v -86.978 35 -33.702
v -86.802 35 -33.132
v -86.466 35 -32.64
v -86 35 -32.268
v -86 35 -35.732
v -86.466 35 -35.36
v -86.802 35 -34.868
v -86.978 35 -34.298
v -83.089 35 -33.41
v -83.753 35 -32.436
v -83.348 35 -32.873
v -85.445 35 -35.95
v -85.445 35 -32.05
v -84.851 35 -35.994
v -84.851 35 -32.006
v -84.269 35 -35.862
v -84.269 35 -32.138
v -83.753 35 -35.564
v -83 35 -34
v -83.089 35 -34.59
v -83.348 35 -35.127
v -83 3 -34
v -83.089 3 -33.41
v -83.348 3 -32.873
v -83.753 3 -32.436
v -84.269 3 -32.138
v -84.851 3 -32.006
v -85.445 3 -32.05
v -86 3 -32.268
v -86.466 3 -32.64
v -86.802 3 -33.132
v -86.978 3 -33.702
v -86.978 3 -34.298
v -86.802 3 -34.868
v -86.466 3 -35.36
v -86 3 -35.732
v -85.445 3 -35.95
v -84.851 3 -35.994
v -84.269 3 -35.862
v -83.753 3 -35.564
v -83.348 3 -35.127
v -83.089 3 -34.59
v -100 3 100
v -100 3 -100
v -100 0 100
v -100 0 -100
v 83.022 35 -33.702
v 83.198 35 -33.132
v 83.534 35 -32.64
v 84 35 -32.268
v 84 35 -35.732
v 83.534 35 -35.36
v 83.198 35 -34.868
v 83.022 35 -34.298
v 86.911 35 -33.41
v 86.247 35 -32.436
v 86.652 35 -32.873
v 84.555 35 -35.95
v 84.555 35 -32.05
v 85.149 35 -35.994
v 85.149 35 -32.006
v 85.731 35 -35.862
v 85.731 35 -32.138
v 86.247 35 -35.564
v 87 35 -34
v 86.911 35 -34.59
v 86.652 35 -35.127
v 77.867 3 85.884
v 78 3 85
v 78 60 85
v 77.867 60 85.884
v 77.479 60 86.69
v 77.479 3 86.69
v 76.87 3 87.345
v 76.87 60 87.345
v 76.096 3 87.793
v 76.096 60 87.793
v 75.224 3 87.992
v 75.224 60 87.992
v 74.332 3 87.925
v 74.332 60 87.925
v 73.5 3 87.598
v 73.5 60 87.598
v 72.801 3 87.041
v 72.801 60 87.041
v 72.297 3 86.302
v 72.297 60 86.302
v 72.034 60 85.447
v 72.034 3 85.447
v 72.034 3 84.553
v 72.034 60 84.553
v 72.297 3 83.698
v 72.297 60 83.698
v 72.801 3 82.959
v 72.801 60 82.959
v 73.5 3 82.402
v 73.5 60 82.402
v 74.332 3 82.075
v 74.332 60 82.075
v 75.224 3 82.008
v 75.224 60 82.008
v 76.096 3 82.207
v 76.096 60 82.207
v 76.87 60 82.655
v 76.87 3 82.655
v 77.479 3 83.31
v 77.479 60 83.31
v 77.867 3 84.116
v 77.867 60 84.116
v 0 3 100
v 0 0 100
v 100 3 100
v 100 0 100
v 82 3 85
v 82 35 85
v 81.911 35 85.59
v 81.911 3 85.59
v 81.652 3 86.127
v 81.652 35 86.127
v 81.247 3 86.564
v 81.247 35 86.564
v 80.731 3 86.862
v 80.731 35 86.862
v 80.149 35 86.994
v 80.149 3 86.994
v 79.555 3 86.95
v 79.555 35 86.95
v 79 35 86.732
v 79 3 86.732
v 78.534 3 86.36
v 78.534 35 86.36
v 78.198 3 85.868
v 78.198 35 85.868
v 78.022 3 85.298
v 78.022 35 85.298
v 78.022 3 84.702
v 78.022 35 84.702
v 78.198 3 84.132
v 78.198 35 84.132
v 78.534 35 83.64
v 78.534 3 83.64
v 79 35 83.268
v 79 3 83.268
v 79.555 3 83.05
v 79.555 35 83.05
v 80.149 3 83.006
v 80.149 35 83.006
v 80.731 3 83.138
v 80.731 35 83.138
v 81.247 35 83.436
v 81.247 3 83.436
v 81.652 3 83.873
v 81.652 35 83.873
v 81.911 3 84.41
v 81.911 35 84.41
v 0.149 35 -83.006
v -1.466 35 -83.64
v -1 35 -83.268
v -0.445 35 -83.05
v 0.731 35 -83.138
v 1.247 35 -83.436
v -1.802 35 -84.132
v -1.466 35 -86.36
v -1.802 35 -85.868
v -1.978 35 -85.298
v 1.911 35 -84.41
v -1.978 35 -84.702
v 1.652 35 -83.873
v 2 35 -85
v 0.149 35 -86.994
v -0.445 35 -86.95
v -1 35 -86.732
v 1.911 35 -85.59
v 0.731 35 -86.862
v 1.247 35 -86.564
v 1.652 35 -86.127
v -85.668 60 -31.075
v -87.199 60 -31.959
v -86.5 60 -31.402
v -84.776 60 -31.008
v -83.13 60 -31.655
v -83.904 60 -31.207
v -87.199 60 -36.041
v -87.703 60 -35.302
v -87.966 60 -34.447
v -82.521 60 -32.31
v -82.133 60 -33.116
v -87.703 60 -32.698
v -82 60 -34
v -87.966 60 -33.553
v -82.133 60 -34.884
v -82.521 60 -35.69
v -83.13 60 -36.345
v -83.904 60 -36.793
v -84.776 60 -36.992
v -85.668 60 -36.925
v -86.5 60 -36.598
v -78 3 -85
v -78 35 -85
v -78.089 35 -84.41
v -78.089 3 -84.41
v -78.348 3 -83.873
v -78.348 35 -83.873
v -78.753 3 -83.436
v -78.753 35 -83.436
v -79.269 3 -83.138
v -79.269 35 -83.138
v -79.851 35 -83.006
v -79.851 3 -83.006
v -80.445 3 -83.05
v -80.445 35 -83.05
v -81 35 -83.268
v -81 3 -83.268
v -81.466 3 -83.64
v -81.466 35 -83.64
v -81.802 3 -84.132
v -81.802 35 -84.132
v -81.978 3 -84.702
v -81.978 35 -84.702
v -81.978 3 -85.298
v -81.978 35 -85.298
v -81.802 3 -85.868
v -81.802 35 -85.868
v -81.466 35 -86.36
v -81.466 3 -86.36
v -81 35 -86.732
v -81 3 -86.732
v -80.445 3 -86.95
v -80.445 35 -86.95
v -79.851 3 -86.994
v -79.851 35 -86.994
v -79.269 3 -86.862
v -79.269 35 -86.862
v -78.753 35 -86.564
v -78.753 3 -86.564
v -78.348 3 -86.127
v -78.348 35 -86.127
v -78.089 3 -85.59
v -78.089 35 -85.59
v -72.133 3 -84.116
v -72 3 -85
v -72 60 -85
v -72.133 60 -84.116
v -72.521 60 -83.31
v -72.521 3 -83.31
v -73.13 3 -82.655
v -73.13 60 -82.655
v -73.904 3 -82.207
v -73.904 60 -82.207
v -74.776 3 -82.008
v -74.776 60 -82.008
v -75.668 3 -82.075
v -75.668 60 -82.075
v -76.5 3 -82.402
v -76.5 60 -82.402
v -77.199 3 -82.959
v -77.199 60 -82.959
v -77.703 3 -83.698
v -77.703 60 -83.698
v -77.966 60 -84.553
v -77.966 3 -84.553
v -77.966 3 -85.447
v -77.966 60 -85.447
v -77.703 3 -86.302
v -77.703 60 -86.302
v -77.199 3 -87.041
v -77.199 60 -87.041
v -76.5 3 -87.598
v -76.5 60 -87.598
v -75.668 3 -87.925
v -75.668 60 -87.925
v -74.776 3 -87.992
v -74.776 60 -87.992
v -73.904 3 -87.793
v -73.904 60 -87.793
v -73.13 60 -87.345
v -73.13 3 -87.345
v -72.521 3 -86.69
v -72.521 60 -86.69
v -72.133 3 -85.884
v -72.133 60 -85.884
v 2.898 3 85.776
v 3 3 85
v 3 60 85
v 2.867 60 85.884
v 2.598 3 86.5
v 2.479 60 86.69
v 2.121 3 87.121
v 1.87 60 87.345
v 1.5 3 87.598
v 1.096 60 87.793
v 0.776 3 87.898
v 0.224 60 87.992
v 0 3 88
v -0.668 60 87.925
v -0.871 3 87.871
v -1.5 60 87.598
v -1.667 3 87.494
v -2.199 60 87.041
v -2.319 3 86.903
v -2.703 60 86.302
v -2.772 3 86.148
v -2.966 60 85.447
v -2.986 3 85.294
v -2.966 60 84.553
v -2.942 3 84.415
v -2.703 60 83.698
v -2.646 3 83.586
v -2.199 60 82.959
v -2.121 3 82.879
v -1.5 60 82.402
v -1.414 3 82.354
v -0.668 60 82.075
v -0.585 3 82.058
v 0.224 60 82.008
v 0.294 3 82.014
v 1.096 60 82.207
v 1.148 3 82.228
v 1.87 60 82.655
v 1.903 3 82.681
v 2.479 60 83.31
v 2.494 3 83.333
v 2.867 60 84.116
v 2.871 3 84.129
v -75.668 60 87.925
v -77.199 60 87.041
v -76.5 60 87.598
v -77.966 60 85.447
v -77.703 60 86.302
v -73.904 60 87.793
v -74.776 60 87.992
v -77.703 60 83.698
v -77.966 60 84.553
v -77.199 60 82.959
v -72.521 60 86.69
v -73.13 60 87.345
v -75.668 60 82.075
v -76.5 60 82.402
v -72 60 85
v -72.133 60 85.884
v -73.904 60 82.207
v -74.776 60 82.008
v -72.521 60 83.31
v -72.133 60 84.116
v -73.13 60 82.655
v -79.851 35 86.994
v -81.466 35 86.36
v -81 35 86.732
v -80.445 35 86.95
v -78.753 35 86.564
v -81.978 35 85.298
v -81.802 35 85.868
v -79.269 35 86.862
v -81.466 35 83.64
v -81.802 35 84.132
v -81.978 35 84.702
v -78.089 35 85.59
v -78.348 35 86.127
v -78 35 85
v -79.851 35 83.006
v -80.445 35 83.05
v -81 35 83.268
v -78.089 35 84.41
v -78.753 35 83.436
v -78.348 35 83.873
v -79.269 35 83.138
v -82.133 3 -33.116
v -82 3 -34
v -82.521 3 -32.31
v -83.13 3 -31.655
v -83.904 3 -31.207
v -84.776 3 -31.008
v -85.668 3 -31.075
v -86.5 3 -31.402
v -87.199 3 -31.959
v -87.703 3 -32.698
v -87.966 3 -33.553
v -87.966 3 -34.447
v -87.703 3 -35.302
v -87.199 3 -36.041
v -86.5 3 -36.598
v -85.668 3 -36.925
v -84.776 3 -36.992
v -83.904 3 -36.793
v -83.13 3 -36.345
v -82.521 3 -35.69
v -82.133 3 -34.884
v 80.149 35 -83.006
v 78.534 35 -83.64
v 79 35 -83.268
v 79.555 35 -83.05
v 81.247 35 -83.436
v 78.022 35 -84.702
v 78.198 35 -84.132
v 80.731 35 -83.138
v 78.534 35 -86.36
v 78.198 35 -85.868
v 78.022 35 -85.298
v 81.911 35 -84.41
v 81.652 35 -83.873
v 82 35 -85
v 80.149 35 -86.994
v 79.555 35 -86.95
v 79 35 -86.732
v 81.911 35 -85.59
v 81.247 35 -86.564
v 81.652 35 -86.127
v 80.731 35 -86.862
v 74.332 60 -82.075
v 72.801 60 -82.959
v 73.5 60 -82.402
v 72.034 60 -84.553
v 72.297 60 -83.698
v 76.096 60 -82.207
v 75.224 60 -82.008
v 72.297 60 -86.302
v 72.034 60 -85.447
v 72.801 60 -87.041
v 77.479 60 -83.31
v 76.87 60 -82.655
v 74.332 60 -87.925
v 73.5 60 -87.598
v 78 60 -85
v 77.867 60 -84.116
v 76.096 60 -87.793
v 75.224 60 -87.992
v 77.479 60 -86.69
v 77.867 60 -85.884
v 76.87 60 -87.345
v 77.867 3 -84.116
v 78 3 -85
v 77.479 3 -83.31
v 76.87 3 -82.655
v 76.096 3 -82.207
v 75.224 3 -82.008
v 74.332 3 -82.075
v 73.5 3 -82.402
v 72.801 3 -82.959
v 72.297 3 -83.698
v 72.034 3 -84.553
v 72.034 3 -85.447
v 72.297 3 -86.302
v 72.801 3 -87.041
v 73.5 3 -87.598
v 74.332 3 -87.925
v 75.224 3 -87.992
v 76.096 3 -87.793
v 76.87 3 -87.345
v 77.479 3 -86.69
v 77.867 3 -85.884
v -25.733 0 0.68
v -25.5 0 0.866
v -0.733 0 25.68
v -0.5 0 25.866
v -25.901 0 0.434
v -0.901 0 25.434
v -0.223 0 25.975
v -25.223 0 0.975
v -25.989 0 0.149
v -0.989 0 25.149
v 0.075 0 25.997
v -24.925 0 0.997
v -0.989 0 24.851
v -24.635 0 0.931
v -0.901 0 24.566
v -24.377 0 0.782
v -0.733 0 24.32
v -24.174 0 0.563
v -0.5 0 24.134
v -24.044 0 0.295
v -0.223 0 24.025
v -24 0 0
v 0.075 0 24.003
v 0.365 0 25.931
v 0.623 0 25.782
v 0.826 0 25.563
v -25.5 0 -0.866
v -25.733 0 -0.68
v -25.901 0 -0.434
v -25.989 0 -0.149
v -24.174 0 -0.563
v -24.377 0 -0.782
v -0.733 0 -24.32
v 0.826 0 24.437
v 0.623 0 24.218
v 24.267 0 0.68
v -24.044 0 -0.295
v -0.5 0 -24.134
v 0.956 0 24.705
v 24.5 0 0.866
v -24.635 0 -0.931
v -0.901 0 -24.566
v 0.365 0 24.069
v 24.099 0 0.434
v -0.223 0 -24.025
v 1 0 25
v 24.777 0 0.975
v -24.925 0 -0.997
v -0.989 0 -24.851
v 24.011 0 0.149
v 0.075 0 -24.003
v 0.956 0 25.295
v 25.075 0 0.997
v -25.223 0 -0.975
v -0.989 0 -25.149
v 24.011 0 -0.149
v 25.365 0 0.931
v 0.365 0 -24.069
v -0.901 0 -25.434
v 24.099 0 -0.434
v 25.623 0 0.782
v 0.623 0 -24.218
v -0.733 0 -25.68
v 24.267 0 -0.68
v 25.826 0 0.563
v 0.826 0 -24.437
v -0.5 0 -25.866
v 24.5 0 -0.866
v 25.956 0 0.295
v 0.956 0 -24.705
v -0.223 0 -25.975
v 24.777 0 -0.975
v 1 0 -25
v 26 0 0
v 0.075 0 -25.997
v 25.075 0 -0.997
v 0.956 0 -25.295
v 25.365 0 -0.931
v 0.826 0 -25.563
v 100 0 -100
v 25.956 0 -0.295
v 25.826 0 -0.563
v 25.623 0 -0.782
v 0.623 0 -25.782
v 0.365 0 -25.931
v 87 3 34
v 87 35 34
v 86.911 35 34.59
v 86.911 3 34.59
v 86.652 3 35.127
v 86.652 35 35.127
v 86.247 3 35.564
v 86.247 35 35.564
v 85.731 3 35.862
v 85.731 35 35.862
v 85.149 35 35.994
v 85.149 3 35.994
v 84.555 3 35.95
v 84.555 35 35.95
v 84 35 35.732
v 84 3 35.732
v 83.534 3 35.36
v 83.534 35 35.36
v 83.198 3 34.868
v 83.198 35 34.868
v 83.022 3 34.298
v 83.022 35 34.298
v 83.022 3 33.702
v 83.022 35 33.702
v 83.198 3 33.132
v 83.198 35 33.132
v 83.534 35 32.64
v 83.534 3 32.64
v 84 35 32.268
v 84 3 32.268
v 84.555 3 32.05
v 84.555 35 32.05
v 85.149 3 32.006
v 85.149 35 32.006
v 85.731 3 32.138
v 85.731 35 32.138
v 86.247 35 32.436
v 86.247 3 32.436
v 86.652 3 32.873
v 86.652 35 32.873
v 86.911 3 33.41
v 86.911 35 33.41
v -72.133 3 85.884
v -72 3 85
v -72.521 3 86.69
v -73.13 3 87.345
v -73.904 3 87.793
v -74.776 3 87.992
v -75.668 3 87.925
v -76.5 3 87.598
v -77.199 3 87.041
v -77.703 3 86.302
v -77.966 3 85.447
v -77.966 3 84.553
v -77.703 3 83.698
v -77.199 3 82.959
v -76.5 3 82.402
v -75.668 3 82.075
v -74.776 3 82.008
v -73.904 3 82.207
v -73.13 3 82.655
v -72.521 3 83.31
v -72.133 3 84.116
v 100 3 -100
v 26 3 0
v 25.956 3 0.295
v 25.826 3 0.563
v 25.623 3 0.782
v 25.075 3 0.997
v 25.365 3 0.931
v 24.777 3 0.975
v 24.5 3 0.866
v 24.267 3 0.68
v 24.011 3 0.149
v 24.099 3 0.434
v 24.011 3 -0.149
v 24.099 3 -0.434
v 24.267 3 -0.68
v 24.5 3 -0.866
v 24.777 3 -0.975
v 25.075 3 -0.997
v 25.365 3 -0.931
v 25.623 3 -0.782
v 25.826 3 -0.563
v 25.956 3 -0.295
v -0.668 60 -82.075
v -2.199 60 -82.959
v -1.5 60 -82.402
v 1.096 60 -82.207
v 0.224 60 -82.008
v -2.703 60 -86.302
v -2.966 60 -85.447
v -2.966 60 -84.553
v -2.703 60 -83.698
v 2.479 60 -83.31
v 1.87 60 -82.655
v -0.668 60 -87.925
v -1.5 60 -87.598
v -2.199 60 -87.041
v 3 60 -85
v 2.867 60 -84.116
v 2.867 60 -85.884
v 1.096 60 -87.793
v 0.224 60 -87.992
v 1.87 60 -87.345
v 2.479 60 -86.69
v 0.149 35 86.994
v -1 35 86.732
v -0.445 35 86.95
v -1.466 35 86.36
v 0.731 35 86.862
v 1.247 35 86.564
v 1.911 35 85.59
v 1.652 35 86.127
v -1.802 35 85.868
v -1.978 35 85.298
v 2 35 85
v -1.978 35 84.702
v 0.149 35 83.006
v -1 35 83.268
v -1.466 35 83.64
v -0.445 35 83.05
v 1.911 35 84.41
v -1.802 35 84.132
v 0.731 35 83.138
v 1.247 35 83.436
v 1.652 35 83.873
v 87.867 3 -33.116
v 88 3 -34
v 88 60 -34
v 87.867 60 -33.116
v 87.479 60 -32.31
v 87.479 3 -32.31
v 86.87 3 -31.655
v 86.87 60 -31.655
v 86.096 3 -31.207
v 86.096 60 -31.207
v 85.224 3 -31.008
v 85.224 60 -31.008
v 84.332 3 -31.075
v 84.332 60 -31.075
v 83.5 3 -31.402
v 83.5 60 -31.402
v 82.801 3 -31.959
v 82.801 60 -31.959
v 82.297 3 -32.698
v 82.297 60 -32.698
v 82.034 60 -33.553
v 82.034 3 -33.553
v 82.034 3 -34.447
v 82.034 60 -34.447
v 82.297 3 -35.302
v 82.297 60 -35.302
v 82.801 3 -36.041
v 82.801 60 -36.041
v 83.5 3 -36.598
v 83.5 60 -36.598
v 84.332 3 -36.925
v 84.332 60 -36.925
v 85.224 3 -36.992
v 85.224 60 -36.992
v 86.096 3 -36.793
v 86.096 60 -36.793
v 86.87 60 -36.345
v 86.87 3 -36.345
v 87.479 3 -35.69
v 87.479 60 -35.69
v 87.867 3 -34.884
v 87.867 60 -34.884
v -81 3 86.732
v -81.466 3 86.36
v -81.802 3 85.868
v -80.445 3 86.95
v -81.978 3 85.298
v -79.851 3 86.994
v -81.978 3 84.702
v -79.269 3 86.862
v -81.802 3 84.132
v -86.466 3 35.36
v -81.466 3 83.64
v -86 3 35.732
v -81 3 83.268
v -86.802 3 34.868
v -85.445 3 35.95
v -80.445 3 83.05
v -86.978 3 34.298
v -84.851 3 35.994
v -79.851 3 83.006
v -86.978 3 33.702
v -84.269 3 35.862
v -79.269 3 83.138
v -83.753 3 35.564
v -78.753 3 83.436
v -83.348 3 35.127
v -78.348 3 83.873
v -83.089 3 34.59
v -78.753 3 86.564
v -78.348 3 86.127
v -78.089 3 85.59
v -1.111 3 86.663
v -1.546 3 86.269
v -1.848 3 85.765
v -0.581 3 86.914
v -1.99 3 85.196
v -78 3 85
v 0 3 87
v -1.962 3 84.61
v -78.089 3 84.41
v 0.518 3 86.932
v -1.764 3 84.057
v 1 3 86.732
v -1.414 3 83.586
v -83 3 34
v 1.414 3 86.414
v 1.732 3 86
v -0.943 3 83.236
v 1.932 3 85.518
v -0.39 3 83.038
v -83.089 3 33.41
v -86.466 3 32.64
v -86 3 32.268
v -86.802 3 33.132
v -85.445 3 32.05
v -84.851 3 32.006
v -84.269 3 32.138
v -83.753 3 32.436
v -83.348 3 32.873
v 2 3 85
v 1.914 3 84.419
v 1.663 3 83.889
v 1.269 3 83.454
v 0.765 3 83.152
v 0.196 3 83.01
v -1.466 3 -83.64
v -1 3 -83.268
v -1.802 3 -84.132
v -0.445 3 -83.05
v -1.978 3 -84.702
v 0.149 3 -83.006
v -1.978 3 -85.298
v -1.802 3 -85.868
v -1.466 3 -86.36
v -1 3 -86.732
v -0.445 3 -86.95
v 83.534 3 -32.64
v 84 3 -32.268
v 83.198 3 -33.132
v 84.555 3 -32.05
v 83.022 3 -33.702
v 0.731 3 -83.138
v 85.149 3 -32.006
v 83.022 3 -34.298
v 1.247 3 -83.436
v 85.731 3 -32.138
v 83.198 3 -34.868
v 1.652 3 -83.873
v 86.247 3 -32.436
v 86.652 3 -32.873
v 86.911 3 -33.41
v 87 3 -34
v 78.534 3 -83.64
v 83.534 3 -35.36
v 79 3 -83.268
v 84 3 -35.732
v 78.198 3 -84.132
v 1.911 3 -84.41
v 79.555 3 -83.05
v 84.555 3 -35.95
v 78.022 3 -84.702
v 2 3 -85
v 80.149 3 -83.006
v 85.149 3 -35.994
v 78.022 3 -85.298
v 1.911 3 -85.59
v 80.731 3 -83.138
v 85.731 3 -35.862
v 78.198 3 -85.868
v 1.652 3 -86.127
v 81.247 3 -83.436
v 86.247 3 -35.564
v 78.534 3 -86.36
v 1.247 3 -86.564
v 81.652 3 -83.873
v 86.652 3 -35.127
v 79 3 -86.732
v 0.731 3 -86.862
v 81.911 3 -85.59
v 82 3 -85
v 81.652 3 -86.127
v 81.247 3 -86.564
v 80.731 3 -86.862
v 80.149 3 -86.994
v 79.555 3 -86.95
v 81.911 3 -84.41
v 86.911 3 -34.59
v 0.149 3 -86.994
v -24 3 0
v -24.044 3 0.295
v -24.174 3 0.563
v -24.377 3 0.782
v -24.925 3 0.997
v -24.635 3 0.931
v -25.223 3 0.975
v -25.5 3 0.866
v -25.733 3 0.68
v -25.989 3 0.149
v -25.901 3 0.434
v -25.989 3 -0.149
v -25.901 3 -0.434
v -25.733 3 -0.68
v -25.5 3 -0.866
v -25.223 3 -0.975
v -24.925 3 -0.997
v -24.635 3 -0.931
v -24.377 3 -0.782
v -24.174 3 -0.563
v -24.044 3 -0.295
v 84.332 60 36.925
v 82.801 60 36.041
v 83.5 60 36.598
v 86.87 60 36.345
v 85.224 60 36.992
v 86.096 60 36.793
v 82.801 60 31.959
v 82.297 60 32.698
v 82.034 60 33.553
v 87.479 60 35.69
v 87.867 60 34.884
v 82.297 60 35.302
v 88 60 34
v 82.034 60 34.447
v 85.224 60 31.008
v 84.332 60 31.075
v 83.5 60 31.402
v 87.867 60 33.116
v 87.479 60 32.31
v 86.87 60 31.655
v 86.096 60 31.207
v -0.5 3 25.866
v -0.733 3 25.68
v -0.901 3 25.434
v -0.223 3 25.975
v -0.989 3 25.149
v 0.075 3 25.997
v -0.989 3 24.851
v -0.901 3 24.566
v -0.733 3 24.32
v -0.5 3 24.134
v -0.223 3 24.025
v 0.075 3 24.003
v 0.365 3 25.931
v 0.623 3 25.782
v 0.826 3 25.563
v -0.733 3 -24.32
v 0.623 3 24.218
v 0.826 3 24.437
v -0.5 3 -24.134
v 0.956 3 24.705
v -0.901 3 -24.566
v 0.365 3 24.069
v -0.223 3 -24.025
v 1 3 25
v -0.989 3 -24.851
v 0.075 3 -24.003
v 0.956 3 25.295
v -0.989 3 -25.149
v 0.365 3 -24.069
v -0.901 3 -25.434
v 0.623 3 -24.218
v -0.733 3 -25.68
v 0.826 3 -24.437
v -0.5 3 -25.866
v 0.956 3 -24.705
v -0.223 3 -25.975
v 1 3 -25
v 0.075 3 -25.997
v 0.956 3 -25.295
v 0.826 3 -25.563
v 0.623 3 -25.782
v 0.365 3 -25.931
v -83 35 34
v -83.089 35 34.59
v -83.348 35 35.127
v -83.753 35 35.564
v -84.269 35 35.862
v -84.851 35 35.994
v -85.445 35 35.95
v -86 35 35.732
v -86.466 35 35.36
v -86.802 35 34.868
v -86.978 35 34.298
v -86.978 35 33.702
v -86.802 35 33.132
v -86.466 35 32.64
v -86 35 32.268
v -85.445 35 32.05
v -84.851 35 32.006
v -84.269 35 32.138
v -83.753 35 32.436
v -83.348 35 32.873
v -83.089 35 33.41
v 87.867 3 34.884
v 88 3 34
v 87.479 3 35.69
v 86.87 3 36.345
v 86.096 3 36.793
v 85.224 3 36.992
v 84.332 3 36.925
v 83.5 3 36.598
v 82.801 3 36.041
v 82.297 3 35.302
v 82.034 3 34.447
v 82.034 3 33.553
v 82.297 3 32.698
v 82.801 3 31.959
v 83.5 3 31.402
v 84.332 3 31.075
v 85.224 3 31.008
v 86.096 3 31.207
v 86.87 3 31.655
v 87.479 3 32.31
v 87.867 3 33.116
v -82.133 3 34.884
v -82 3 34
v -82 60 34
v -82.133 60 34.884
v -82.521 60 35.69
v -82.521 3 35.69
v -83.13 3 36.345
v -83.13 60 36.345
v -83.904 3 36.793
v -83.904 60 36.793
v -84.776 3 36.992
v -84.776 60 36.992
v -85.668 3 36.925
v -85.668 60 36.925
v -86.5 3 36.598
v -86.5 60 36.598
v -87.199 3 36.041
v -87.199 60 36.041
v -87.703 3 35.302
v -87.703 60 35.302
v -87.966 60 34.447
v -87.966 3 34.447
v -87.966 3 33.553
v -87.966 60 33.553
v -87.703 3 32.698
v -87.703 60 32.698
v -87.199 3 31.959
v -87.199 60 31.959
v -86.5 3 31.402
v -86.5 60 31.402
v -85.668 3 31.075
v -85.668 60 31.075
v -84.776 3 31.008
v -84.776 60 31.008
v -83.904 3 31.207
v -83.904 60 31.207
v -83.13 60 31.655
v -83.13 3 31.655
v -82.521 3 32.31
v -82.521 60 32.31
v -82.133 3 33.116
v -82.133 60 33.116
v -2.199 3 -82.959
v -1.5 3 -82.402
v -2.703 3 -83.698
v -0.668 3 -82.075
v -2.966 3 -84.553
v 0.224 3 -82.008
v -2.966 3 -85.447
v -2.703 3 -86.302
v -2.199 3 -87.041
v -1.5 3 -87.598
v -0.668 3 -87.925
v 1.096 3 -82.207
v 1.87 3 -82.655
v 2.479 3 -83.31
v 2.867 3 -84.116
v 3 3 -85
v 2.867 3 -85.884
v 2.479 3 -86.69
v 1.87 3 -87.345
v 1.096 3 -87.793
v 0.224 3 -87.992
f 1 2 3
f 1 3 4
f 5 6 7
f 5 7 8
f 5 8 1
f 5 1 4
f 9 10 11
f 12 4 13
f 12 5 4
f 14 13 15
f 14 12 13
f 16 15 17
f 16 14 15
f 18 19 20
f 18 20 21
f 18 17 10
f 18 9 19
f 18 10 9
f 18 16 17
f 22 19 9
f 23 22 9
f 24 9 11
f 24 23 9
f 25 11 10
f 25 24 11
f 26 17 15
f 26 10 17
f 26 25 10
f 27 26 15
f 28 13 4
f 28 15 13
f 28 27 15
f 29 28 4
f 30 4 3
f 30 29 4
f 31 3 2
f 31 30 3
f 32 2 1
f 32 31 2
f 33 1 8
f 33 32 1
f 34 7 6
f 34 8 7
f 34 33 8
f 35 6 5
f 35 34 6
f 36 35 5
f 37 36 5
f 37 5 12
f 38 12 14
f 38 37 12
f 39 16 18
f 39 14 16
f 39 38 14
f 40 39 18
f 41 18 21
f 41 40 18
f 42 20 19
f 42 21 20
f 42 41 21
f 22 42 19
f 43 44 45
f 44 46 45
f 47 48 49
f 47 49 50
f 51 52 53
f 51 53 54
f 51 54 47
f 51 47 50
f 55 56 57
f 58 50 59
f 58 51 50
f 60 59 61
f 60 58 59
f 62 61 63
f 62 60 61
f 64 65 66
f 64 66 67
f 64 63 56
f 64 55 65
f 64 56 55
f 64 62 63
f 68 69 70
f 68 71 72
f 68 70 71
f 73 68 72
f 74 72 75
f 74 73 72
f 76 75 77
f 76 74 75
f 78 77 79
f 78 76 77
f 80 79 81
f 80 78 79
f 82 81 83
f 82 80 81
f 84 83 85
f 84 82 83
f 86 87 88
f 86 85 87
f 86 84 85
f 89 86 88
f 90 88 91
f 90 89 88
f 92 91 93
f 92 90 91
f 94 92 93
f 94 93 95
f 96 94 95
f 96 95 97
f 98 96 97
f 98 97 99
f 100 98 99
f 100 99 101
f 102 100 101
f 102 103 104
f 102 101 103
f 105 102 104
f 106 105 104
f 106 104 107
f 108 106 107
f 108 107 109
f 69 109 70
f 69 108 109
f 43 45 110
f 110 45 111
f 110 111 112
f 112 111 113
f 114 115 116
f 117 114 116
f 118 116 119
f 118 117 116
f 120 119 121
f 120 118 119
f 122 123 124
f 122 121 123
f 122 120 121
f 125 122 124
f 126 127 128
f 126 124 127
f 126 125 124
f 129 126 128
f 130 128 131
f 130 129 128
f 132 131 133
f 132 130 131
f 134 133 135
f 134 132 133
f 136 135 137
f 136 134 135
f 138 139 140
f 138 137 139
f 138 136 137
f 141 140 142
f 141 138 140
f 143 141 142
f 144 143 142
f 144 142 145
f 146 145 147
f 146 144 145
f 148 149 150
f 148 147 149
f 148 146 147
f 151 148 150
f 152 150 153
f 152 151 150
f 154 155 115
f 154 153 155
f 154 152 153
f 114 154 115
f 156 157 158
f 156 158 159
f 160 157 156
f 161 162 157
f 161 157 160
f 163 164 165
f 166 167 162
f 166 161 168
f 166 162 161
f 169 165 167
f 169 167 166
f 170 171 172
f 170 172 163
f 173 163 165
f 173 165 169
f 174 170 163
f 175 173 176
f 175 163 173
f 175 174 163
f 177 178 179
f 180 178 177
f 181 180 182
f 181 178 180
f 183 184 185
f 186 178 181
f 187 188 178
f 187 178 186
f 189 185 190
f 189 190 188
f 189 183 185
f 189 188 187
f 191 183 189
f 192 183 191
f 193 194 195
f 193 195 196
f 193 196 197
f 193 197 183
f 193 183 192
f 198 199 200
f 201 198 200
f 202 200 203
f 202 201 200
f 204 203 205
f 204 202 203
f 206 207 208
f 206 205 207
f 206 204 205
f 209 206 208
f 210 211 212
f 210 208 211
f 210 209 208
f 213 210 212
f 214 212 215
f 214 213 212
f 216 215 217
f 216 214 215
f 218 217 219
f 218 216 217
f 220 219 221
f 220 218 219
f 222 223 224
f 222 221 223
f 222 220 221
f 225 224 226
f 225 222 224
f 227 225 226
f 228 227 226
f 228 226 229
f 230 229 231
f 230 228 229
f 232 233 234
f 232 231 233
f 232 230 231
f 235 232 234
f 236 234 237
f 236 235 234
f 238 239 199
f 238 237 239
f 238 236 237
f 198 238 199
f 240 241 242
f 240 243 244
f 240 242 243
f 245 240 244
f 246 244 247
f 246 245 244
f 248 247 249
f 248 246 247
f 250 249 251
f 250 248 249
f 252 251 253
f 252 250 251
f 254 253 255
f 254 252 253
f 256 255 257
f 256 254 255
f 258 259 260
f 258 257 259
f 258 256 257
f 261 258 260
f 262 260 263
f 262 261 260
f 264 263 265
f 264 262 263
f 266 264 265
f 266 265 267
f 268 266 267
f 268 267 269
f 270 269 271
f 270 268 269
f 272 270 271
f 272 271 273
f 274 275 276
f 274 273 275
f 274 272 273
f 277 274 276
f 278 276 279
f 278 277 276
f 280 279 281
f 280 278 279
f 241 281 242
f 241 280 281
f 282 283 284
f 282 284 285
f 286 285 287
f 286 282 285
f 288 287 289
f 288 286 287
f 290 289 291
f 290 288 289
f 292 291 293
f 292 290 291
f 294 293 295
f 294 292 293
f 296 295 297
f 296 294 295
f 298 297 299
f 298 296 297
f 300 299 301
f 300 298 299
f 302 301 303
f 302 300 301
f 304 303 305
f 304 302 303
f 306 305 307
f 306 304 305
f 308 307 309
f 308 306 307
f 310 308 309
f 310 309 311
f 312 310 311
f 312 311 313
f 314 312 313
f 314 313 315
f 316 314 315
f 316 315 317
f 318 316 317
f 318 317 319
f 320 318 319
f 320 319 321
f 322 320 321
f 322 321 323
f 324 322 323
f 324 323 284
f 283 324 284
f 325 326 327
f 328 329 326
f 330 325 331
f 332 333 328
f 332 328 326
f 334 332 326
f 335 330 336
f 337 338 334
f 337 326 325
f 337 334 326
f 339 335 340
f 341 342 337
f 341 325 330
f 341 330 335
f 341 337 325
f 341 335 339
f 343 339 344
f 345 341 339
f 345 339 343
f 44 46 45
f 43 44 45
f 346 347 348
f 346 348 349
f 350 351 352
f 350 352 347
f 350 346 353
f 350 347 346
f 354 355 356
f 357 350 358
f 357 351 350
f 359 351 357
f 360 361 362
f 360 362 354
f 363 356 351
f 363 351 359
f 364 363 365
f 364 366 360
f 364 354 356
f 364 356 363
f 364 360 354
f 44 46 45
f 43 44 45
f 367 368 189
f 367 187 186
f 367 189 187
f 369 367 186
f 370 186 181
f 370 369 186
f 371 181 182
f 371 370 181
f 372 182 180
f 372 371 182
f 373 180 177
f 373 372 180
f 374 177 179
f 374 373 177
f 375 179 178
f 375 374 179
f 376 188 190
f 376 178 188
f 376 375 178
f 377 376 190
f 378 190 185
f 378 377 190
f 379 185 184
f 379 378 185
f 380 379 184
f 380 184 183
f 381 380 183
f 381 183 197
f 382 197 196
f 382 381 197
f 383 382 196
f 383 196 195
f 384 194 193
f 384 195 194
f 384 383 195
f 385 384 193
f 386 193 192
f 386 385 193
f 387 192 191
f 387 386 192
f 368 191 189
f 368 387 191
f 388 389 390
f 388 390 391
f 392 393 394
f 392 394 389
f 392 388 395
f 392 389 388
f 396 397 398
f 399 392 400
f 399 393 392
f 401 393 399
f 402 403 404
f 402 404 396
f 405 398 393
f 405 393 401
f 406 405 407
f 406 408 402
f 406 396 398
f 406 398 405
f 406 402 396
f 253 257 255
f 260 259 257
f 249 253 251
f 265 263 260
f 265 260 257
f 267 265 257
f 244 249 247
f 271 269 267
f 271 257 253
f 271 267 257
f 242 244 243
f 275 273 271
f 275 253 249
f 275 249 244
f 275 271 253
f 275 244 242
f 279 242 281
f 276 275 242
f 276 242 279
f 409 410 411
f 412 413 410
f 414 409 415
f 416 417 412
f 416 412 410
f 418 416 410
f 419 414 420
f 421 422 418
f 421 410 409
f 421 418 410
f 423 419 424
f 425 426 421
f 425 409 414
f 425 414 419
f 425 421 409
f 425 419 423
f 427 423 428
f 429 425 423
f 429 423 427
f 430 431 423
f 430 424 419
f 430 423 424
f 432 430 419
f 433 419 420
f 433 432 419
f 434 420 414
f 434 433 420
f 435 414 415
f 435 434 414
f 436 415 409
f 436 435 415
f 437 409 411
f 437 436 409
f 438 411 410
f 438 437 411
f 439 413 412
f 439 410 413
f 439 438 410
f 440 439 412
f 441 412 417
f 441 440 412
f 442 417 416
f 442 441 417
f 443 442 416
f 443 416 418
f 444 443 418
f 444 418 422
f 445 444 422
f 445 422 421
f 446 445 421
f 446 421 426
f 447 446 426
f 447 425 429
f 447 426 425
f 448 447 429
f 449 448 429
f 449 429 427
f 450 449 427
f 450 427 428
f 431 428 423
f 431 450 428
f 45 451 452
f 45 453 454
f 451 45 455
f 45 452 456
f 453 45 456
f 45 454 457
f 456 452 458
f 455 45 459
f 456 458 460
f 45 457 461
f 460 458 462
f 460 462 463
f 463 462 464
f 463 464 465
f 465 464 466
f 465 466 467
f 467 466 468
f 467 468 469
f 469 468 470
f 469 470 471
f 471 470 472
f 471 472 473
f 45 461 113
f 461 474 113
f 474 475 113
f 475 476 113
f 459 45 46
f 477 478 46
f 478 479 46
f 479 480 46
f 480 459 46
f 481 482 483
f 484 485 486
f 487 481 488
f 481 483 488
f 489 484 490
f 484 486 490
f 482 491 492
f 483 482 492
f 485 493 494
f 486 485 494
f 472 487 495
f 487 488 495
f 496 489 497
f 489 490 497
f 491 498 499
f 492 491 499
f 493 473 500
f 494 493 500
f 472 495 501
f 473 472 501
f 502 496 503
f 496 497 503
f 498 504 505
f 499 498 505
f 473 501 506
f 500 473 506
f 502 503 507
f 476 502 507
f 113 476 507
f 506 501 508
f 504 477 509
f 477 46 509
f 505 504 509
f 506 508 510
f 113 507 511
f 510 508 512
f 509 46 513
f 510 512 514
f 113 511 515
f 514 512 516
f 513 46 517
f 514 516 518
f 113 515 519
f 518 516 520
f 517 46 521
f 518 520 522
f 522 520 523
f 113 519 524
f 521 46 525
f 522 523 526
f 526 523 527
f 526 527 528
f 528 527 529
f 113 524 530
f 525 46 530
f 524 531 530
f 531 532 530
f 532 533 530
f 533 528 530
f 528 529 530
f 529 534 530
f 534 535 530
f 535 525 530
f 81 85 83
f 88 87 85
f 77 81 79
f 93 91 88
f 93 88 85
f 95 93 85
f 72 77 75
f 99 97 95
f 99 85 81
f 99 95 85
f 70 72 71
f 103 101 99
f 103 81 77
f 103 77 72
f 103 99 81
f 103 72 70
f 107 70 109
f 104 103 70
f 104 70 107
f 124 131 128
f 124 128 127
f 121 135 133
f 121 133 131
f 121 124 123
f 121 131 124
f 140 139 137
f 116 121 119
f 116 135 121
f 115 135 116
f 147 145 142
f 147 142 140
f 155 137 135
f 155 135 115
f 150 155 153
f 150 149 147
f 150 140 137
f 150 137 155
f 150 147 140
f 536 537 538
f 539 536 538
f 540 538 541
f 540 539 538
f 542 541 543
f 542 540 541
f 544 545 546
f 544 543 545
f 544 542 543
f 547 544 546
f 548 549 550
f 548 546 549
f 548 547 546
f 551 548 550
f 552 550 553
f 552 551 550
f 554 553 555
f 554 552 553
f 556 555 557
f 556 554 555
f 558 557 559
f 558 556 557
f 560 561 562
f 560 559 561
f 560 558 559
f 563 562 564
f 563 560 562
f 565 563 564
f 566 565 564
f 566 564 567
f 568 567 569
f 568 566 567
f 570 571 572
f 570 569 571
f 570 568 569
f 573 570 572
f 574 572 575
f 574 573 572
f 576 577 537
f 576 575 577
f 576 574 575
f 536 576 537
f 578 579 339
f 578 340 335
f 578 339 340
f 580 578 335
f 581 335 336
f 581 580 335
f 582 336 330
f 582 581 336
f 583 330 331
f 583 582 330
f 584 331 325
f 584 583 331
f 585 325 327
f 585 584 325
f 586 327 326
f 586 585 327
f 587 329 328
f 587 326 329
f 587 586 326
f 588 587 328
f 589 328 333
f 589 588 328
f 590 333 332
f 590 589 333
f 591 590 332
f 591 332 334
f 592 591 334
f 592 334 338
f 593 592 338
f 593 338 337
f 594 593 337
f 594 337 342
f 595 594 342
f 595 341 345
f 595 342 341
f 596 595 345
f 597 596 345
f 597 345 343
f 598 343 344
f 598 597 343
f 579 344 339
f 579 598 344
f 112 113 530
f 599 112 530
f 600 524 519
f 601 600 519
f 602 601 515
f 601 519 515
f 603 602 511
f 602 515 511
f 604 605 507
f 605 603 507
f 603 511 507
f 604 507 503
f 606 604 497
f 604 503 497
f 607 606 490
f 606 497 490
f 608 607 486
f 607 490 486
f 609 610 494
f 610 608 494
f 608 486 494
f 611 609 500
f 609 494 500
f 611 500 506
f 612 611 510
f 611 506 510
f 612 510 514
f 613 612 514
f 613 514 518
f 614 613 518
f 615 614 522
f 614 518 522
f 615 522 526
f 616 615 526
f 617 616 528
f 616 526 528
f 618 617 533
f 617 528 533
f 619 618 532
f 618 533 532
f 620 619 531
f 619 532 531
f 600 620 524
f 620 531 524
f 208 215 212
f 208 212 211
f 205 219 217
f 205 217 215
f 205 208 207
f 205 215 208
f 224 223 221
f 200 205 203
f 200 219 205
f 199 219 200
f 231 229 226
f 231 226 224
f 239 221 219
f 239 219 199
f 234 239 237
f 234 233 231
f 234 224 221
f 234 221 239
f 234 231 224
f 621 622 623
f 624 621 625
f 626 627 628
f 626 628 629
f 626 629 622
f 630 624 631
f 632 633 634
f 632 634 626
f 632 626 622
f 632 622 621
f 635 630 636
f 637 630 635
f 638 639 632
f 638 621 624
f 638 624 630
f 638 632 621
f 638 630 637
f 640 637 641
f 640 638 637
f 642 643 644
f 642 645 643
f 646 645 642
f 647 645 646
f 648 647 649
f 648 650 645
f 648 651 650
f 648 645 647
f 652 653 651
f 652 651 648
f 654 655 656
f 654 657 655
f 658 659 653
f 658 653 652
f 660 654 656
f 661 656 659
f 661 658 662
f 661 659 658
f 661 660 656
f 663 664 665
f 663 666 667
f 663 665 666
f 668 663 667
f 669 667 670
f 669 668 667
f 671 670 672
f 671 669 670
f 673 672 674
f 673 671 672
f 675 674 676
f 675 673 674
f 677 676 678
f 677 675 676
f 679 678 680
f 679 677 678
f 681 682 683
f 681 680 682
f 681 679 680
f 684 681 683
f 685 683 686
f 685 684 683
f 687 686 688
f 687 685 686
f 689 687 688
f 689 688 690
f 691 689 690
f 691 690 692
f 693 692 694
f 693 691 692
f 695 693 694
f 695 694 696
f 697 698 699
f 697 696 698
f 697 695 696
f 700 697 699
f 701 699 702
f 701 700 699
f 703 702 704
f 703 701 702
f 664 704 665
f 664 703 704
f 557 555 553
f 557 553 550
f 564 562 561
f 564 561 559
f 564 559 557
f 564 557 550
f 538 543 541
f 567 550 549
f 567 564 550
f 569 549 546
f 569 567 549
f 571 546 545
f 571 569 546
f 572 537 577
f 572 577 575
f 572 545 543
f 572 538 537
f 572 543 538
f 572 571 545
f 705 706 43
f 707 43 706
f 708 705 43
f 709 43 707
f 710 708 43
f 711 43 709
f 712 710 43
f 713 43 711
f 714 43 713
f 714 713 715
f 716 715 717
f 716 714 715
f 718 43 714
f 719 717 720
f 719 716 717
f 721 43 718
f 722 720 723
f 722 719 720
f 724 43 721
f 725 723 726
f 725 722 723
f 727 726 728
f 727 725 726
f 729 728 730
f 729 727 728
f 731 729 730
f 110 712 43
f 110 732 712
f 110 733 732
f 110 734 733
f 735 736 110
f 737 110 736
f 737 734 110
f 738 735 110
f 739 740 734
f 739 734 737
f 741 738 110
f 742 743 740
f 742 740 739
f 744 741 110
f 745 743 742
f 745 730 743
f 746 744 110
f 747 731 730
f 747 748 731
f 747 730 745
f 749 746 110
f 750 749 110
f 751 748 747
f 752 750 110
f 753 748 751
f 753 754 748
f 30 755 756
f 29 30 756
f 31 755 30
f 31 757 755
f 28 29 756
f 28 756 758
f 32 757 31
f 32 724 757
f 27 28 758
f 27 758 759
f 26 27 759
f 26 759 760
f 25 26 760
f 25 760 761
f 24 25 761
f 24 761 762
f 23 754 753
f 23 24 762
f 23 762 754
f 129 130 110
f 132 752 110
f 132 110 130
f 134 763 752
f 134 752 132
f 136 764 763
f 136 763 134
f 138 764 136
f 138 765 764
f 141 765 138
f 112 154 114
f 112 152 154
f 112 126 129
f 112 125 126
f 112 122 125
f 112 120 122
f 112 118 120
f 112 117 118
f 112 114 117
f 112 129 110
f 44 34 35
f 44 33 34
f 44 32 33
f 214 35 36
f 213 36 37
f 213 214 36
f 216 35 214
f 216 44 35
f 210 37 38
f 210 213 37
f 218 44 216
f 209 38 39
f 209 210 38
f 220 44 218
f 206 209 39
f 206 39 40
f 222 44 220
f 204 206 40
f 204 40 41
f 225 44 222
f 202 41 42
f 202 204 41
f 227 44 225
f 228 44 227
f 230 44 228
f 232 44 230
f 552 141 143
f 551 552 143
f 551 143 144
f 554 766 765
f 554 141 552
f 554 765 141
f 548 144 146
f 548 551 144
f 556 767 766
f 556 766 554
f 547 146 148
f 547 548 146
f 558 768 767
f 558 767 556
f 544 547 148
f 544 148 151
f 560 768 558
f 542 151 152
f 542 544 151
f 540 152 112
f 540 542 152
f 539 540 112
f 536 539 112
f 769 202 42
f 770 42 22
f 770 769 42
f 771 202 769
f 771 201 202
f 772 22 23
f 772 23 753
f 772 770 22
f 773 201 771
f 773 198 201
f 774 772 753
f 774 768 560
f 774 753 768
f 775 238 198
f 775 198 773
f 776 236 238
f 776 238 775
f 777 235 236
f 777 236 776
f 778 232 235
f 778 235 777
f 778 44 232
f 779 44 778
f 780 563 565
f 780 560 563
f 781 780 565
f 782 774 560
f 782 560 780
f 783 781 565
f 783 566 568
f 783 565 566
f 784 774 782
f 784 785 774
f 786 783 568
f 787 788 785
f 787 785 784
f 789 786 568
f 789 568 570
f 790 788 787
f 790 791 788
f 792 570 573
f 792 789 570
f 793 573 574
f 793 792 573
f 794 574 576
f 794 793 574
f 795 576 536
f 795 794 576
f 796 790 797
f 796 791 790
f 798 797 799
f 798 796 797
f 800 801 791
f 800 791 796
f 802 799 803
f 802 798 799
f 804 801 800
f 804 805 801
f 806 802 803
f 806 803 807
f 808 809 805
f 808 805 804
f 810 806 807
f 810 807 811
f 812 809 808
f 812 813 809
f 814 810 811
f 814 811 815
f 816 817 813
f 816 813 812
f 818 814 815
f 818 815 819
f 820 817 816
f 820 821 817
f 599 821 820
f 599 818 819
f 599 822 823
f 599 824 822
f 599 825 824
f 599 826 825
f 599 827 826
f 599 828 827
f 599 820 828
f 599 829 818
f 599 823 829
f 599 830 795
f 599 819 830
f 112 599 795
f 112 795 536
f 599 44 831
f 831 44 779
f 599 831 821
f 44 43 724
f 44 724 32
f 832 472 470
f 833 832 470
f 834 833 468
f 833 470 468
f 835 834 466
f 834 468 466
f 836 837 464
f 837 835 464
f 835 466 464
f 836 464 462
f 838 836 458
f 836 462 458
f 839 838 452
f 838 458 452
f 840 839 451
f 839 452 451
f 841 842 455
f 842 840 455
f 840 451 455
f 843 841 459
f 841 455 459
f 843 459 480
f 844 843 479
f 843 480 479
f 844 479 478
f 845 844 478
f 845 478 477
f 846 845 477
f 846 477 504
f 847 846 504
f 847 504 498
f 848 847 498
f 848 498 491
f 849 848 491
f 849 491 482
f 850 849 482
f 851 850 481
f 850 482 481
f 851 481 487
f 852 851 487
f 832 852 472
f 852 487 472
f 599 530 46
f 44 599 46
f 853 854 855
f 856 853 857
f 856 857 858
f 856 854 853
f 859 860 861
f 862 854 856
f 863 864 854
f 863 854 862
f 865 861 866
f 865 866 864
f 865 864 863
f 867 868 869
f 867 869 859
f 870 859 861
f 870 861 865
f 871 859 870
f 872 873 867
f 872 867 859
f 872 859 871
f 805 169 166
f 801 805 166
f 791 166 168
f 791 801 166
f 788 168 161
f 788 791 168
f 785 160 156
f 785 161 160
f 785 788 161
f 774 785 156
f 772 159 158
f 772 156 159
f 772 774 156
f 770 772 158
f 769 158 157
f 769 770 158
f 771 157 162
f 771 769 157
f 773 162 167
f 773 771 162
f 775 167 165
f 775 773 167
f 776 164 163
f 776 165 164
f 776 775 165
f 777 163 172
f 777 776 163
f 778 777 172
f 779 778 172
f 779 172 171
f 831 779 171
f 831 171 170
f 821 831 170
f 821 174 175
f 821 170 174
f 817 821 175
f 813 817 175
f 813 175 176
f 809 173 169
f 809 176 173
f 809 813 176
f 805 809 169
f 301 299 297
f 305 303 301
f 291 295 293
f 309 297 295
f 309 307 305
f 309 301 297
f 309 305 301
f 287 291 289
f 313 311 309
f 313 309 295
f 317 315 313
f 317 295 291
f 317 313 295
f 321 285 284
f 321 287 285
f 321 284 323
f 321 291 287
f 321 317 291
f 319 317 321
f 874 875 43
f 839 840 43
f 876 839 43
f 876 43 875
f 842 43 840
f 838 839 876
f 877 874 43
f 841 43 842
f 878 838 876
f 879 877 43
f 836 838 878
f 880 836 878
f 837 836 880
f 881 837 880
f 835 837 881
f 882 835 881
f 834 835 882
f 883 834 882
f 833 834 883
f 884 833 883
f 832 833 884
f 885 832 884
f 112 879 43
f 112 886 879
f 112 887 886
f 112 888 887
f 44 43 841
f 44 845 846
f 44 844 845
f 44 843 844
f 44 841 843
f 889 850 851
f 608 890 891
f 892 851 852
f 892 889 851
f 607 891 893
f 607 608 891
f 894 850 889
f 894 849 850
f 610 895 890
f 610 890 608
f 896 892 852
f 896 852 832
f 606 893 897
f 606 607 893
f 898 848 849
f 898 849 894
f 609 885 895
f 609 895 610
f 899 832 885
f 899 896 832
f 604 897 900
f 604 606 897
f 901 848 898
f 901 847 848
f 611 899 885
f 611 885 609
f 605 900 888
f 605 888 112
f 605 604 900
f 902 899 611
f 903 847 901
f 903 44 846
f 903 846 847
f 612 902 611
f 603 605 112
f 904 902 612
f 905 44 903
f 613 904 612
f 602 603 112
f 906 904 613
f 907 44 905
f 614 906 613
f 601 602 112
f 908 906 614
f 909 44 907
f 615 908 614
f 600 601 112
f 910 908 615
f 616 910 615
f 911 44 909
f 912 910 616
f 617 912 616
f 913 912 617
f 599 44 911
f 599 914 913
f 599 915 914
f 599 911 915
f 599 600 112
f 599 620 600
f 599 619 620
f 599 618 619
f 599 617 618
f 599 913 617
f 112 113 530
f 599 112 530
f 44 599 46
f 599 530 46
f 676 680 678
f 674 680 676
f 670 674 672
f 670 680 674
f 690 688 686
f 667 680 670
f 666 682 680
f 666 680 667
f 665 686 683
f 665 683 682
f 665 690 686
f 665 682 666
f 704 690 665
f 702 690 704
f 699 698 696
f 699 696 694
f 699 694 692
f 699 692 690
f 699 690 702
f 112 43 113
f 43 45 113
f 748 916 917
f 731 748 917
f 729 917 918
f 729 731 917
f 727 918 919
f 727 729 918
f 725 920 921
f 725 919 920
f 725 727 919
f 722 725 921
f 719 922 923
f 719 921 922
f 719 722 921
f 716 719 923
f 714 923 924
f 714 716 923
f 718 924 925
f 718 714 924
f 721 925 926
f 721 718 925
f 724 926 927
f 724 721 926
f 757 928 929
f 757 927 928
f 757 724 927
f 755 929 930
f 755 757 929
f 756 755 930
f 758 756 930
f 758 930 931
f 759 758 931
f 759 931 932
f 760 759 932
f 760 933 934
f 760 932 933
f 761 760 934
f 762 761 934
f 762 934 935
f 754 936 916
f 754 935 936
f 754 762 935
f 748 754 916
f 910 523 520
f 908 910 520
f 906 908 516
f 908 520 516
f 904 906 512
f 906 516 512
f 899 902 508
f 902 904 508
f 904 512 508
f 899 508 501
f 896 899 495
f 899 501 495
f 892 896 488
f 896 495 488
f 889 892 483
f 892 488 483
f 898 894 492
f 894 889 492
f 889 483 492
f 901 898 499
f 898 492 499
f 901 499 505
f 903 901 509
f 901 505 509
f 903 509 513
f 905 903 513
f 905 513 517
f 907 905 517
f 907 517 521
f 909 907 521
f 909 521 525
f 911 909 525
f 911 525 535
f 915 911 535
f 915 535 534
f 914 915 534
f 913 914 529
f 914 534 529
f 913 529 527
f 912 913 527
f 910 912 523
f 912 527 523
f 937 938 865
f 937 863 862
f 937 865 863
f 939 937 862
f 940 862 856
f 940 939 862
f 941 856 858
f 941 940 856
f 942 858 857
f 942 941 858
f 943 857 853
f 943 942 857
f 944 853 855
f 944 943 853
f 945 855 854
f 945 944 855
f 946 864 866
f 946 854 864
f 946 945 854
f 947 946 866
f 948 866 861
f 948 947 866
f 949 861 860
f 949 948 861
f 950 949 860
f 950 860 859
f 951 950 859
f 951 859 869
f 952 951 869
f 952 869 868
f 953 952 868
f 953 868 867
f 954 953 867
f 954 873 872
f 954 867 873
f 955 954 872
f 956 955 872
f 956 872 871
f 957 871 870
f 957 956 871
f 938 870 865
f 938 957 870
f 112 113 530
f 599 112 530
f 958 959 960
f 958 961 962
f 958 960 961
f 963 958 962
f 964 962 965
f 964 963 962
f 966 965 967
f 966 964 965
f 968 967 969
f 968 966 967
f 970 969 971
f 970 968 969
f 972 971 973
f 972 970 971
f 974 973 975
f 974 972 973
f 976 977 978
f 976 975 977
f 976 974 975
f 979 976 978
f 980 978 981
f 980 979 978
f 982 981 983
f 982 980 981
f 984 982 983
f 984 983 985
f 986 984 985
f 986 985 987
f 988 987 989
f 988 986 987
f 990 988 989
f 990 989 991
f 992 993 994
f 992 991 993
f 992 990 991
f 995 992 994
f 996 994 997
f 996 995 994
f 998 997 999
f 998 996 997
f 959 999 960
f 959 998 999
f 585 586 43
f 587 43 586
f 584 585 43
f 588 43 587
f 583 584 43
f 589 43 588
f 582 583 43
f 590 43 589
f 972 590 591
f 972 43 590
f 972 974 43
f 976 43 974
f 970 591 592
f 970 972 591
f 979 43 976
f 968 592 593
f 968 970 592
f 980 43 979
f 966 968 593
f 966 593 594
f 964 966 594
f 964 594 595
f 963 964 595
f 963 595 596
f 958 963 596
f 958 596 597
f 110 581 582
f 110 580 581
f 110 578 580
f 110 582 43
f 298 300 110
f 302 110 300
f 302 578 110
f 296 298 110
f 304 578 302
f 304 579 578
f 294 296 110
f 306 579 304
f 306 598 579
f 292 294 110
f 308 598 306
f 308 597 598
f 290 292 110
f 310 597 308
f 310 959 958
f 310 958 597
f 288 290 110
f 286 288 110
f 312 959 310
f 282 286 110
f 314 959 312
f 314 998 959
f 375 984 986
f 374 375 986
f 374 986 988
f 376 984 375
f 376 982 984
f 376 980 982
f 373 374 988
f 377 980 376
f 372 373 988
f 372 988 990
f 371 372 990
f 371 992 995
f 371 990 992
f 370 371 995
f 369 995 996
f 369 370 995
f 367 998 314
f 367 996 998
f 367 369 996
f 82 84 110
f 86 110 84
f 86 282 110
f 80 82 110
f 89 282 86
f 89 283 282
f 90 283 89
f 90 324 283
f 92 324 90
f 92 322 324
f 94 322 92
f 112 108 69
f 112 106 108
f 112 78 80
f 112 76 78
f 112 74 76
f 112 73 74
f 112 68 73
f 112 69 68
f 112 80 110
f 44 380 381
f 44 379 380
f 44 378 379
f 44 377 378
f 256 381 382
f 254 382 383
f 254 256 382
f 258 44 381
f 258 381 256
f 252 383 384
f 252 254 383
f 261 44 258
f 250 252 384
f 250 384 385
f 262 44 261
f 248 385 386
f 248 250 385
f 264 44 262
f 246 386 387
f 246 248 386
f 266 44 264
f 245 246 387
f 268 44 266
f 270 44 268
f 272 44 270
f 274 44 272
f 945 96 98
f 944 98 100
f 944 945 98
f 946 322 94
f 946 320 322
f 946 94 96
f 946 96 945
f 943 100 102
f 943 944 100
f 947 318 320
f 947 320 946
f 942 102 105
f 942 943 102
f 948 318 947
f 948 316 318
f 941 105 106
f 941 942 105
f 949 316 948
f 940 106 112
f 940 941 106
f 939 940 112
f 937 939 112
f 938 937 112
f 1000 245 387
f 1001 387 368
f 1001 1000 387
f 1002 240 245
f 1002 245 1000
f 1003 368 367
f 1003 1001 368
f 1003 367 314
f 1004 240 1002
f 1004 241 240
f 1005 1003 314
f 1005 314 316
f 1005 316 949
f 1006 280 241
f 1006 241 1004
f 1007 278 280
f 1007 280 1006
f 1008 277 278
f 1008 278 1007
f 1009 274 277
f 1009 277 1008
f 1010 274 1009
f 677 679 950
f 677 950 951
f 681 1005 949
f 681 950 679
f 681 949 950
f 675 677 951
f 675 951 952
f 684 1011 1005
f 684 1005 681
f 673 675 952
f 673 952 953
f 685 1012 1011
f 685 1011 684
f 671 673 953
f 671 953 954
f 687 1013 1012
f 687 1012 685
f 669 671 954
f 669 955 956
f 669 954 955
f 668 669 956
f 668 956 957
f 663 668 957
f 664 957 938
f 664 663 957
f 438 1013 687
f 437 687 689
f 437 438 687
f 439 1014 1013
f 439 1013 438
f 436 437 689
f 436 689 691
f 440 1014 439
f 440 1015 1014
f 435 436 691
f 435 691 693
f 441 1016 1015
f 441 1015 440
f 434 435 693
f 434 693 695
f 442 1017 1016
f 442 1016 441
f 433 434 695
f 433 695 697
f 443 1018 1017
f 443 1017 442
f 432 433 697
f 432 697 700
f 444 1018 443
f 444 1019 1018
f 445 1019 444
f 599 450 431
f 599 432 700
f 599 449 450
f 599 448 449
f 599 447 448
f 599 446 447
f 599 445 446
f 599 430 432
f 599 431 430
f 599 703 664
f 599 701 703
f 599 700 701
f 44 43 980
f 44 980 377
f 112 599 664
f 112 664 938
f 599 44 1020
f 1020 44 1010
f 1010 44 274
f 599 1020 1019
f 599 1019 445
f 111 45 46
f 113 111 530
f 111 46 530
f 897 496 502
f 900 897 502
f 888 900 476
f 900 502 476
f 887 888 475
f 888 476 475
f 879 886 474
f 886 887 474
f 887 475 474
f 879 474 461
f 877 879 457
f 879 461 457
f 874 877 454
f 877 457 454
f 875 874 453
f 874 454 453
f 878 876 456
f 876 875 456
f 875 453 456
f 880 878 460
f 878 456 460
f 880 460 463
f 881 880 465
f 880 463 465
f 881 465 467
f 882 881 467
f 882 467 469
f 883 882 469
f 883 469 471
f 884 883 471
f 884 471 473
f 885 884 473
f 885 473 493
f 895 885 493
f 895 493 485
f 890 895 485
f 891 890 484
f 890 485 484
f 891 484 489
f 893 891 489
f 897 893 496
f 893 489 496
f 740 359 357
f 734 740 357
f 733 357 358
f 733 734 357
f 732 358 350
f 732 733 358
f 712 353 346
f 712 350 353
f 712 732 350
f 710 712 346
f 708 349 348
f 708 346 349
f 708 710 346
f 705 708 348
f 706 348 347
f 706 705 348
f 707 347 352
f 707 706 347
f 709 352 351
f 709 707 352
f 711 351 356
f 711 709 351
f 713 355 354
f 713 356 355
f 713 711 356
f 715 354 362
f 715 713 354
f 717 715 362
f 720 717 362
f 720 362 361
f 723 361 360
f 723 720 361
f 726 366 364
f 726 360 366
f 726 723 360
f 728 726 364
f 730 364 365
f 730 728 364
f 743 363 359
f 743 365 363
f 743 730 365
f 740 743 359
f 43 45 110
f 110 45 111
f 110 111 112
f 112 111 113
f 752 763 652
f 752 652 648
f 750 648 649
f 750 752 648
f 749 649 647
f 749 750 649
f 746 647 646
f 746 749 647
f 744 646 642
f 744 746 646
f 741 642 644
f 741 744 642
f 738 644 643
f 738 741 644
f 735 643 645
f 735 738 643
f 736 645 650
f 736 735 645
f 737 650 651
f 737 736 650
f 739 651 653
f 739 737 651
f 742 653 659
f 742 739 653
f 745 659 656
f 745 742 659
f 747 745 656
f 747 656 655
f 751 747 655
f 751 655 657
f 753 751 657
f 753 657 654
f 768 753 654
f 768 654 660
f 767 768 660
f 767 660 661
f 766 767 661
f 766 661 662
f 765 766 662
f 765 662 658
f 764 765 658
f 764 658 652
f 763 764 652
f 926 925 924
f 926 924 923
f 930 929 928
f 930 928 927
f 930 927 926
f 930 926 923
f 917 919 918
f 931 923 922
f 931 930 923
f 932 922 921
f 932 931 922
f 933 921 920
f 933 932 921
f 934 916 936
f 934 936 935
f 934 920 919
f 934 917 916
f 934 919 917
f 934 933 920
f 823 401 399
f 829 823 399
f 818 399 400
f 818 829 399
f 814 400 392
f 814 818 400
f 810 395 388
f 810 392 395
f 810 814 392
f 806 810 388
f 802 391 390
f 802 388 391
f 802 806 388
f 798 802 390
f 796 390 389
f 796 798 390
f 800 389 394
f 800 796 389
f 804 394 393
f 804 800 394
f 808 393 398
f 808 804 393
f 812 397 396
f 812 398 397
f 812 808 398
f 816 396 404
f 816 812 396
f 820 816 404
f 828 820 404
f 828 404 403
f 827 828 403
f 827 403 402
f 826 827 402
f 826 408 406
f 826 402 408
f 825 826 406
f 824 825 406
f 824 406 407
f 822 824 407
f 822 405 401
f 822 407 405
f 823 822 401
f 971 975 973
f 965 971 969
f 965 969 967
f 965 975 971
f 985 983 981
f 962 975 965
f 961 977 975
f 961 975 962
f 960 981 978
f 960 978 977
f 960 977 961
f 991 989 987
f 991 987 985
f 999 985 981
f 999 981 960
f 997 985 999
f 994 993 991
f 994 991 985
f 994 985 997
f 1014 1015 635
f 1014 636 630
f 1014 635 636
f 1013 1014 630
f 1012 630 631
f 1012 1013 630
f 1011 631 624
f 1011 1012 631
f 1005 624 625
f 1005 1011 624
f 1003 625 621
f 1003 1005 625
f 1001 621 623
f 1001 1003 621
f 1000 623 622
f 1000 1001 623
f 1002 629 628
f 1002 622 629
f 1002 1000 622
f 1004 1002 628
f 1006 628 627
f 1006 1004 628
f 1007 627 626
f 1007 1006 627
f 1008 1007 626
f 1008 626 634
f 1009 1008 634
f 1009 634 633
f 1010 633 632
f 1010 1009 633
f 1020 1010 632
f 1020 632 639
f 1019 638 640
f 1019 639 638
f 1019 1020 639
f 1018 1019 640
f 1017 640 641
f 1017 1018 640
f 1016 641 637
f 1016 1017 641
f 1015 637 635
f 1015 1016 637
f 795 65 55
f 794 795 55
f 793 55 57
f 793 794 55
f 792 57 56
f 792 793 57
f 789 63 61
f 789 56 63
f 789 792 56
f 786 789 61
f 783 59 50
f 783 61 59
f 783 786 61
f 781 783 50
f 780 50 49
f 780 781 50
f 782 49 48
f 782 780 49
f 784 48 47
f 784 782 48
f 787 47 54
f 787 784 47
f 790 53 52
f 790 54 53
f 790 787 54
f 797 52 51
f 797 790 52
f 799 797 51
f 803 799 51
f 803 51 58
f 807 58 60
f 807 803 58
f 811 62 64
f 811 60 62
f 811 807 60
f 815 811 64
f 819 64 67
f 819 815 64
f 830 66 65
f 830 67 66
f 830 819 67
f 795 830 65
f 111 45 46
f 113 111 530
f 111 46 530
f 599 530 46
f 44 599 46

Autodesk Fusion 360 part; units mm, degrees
sketch "Sketch2" plane through (0, 0, 0) normal (0, 1, 0) x (1, 0, 0)
  line L0 (100, 100) -> (-100, 100)
  line L1 (-100, 100) -> (-100, -100)
  line L2 (-100, -100) -> (100, -100)
  line L3 (100, -100) -> (100, 100)
  line L4 (100, 100) -> (-100, -100) construction
  line L5 (-100, 100) -> (100, -100) construction
  circle A0 centre (0, -85) radius 3
  circle A1 centre (85, -34) radius 3
  circle A2 centre (75, -85) radius 3
  line L6 (0, -100) -> (0, -75.336)
  line L7 (100, 0) -> (77.1894, 0)
  circle A3 centre (-85, -34) radius 3
  circle A4 centre (0, -85) radius 3
  circle A5 centre (-75, -85) radius 3
  circle A6 centre (85, 34) radius 3
  circle A7 centre (75, 85) radius 3
  circle A8 centre (0, 85) radius 3
  circle A9 centre (-75, 85) radius 3
  circle A10 centre (-85, 34) radius 3
  dimension "d3" = 200
  dimension "d4" = 200
  dimension "d5" = 6
  dimension "d6" = 6
  dimension "d7" = 6
  dimension "d8" = 15
  dimension "d9" = 25
  dimension "d10" = 15
  dimension "d11" = 66
  dimension "d12" = 100
  dimension "d13" = 15
extrude "Extrude2" add sketch "Sketch2" along normal blind 3 makes body 1
extrude "Extrude3" add sketch "Sketch2" along normal blind 60 contours A0 L6 A4 | A0 L6 A4 | A1 | A2 | A3 | A5 | A6 | A7 | A8 | A9 | A10 bodies 1
sketch "Sketch3" plane through (0, 0, 0) normal (0, 1, 0) x (1, 0, 0)
  line L0 (100, 100) -> (-100, 100)
  line L1 (-100, 100) -> (-100, -100)
  line L2 (-100, -100) -> (100, -100)
  line L3 (100, -100) -> (100, 100)
  line L4 (100, 100) -> (-100, -100) construction
  line L5 (-100, 100) -> (100, -100) construction
  circle A0 centre (0, -85) radius 2
  circle A1 centre (80, -85) radius 2
  circle A2 centre (85, -34) radius 2
  line L6 (100, 0) -> (78.2297, 0)
  line L7 (0, -100) -> (0, -63.6299)
  circle A3 centre (-80, -85) radius 2
  circle A4 centre (-85, -34) radius 2
  circle A5 centre (-85, 34) radius 2
  circle A6 centre (-80, 85) radius 2
  circle A7 centre (0, 85) radius 2
  circle A8 centre (80, 85) radius 2
  circle A9 centre (85, 34) radius 2
  point P0 (0, -85)
  dimension "d18" = 200
  dimension "d19" = 200
  dimension "d20" = 4
  dimension "d21" = 4
  dimension "d22" = 4
  dimension "d23" = 15
  dimension "d24" = 100
  dimension "d25" = 15
  dimension "d26" = 20
  dimension "d27" = 15
  dimension "d28" = 66
extrude "Extrude4" add sketch "Sketch3" along normal blind 3 separate body makes body 2
extrude "Extrude5" add sketch "Sketch3" along normal blind 35 contours A0 L7 | A0 L7 | A1 | A2 | A3 | A4 | A5 | A6 | A7 | A8 | A9 bodies 2
sketch "Sketch4" plane through (0, 0, 0) normal (0, 1, 0) x (1, 0, 0)
  line L0 (100, 100) -> (-100, 100)
  line L1 (-100, 100) -> (-100, -100)
  line L2 (-100, -100) -> (100, -100)
  line L3 (100, -100) -> (100, 100)
  line L4 (100, 100) -> (-100, -100) construction
  line L5 (-100, 100) -> (100, -100) construction
  circle A0 centre (-25, 0) radius 1
  circle A1 centre (0, -25) radius 1
  circle A2 centre (25, 0) radius 1
  circle A3 centre (0, 25) radius 1
  dimension "d33" = 200
  dimension "d34" = 200
  dimension "d37" = 2
  dimension "d38" = 75
  dimension "d39" = 100
  dimension "d41" = 360
extrude "Extrude6" add sketch "Sketch4" along normal blind 3 separate body makes body 3
copy_body "Body->Comp1" bodies 1 removing the originals makes body 4 in component "Component"
copy_body "Body->Comp2" bodies 2 removing the originals makes body 5 in component "Component'"
copy_body "Body->Comp4" bodies 3 removing the originals makes body 6 in component "Component''"
component "Component" placed x (1, 0, 0) y (0, 1, 0) z (0, 0, 1) at (0, 0, 0)
component "Component'" placed x (1, 0, 0) y (0, 1, 0) z (0, 0, 1) at (0, 0, 0)
component "Component''" placed x (1, 0, 0) y (0, 1, 0) z (0, 0, 1) at (0, 0, 0)
